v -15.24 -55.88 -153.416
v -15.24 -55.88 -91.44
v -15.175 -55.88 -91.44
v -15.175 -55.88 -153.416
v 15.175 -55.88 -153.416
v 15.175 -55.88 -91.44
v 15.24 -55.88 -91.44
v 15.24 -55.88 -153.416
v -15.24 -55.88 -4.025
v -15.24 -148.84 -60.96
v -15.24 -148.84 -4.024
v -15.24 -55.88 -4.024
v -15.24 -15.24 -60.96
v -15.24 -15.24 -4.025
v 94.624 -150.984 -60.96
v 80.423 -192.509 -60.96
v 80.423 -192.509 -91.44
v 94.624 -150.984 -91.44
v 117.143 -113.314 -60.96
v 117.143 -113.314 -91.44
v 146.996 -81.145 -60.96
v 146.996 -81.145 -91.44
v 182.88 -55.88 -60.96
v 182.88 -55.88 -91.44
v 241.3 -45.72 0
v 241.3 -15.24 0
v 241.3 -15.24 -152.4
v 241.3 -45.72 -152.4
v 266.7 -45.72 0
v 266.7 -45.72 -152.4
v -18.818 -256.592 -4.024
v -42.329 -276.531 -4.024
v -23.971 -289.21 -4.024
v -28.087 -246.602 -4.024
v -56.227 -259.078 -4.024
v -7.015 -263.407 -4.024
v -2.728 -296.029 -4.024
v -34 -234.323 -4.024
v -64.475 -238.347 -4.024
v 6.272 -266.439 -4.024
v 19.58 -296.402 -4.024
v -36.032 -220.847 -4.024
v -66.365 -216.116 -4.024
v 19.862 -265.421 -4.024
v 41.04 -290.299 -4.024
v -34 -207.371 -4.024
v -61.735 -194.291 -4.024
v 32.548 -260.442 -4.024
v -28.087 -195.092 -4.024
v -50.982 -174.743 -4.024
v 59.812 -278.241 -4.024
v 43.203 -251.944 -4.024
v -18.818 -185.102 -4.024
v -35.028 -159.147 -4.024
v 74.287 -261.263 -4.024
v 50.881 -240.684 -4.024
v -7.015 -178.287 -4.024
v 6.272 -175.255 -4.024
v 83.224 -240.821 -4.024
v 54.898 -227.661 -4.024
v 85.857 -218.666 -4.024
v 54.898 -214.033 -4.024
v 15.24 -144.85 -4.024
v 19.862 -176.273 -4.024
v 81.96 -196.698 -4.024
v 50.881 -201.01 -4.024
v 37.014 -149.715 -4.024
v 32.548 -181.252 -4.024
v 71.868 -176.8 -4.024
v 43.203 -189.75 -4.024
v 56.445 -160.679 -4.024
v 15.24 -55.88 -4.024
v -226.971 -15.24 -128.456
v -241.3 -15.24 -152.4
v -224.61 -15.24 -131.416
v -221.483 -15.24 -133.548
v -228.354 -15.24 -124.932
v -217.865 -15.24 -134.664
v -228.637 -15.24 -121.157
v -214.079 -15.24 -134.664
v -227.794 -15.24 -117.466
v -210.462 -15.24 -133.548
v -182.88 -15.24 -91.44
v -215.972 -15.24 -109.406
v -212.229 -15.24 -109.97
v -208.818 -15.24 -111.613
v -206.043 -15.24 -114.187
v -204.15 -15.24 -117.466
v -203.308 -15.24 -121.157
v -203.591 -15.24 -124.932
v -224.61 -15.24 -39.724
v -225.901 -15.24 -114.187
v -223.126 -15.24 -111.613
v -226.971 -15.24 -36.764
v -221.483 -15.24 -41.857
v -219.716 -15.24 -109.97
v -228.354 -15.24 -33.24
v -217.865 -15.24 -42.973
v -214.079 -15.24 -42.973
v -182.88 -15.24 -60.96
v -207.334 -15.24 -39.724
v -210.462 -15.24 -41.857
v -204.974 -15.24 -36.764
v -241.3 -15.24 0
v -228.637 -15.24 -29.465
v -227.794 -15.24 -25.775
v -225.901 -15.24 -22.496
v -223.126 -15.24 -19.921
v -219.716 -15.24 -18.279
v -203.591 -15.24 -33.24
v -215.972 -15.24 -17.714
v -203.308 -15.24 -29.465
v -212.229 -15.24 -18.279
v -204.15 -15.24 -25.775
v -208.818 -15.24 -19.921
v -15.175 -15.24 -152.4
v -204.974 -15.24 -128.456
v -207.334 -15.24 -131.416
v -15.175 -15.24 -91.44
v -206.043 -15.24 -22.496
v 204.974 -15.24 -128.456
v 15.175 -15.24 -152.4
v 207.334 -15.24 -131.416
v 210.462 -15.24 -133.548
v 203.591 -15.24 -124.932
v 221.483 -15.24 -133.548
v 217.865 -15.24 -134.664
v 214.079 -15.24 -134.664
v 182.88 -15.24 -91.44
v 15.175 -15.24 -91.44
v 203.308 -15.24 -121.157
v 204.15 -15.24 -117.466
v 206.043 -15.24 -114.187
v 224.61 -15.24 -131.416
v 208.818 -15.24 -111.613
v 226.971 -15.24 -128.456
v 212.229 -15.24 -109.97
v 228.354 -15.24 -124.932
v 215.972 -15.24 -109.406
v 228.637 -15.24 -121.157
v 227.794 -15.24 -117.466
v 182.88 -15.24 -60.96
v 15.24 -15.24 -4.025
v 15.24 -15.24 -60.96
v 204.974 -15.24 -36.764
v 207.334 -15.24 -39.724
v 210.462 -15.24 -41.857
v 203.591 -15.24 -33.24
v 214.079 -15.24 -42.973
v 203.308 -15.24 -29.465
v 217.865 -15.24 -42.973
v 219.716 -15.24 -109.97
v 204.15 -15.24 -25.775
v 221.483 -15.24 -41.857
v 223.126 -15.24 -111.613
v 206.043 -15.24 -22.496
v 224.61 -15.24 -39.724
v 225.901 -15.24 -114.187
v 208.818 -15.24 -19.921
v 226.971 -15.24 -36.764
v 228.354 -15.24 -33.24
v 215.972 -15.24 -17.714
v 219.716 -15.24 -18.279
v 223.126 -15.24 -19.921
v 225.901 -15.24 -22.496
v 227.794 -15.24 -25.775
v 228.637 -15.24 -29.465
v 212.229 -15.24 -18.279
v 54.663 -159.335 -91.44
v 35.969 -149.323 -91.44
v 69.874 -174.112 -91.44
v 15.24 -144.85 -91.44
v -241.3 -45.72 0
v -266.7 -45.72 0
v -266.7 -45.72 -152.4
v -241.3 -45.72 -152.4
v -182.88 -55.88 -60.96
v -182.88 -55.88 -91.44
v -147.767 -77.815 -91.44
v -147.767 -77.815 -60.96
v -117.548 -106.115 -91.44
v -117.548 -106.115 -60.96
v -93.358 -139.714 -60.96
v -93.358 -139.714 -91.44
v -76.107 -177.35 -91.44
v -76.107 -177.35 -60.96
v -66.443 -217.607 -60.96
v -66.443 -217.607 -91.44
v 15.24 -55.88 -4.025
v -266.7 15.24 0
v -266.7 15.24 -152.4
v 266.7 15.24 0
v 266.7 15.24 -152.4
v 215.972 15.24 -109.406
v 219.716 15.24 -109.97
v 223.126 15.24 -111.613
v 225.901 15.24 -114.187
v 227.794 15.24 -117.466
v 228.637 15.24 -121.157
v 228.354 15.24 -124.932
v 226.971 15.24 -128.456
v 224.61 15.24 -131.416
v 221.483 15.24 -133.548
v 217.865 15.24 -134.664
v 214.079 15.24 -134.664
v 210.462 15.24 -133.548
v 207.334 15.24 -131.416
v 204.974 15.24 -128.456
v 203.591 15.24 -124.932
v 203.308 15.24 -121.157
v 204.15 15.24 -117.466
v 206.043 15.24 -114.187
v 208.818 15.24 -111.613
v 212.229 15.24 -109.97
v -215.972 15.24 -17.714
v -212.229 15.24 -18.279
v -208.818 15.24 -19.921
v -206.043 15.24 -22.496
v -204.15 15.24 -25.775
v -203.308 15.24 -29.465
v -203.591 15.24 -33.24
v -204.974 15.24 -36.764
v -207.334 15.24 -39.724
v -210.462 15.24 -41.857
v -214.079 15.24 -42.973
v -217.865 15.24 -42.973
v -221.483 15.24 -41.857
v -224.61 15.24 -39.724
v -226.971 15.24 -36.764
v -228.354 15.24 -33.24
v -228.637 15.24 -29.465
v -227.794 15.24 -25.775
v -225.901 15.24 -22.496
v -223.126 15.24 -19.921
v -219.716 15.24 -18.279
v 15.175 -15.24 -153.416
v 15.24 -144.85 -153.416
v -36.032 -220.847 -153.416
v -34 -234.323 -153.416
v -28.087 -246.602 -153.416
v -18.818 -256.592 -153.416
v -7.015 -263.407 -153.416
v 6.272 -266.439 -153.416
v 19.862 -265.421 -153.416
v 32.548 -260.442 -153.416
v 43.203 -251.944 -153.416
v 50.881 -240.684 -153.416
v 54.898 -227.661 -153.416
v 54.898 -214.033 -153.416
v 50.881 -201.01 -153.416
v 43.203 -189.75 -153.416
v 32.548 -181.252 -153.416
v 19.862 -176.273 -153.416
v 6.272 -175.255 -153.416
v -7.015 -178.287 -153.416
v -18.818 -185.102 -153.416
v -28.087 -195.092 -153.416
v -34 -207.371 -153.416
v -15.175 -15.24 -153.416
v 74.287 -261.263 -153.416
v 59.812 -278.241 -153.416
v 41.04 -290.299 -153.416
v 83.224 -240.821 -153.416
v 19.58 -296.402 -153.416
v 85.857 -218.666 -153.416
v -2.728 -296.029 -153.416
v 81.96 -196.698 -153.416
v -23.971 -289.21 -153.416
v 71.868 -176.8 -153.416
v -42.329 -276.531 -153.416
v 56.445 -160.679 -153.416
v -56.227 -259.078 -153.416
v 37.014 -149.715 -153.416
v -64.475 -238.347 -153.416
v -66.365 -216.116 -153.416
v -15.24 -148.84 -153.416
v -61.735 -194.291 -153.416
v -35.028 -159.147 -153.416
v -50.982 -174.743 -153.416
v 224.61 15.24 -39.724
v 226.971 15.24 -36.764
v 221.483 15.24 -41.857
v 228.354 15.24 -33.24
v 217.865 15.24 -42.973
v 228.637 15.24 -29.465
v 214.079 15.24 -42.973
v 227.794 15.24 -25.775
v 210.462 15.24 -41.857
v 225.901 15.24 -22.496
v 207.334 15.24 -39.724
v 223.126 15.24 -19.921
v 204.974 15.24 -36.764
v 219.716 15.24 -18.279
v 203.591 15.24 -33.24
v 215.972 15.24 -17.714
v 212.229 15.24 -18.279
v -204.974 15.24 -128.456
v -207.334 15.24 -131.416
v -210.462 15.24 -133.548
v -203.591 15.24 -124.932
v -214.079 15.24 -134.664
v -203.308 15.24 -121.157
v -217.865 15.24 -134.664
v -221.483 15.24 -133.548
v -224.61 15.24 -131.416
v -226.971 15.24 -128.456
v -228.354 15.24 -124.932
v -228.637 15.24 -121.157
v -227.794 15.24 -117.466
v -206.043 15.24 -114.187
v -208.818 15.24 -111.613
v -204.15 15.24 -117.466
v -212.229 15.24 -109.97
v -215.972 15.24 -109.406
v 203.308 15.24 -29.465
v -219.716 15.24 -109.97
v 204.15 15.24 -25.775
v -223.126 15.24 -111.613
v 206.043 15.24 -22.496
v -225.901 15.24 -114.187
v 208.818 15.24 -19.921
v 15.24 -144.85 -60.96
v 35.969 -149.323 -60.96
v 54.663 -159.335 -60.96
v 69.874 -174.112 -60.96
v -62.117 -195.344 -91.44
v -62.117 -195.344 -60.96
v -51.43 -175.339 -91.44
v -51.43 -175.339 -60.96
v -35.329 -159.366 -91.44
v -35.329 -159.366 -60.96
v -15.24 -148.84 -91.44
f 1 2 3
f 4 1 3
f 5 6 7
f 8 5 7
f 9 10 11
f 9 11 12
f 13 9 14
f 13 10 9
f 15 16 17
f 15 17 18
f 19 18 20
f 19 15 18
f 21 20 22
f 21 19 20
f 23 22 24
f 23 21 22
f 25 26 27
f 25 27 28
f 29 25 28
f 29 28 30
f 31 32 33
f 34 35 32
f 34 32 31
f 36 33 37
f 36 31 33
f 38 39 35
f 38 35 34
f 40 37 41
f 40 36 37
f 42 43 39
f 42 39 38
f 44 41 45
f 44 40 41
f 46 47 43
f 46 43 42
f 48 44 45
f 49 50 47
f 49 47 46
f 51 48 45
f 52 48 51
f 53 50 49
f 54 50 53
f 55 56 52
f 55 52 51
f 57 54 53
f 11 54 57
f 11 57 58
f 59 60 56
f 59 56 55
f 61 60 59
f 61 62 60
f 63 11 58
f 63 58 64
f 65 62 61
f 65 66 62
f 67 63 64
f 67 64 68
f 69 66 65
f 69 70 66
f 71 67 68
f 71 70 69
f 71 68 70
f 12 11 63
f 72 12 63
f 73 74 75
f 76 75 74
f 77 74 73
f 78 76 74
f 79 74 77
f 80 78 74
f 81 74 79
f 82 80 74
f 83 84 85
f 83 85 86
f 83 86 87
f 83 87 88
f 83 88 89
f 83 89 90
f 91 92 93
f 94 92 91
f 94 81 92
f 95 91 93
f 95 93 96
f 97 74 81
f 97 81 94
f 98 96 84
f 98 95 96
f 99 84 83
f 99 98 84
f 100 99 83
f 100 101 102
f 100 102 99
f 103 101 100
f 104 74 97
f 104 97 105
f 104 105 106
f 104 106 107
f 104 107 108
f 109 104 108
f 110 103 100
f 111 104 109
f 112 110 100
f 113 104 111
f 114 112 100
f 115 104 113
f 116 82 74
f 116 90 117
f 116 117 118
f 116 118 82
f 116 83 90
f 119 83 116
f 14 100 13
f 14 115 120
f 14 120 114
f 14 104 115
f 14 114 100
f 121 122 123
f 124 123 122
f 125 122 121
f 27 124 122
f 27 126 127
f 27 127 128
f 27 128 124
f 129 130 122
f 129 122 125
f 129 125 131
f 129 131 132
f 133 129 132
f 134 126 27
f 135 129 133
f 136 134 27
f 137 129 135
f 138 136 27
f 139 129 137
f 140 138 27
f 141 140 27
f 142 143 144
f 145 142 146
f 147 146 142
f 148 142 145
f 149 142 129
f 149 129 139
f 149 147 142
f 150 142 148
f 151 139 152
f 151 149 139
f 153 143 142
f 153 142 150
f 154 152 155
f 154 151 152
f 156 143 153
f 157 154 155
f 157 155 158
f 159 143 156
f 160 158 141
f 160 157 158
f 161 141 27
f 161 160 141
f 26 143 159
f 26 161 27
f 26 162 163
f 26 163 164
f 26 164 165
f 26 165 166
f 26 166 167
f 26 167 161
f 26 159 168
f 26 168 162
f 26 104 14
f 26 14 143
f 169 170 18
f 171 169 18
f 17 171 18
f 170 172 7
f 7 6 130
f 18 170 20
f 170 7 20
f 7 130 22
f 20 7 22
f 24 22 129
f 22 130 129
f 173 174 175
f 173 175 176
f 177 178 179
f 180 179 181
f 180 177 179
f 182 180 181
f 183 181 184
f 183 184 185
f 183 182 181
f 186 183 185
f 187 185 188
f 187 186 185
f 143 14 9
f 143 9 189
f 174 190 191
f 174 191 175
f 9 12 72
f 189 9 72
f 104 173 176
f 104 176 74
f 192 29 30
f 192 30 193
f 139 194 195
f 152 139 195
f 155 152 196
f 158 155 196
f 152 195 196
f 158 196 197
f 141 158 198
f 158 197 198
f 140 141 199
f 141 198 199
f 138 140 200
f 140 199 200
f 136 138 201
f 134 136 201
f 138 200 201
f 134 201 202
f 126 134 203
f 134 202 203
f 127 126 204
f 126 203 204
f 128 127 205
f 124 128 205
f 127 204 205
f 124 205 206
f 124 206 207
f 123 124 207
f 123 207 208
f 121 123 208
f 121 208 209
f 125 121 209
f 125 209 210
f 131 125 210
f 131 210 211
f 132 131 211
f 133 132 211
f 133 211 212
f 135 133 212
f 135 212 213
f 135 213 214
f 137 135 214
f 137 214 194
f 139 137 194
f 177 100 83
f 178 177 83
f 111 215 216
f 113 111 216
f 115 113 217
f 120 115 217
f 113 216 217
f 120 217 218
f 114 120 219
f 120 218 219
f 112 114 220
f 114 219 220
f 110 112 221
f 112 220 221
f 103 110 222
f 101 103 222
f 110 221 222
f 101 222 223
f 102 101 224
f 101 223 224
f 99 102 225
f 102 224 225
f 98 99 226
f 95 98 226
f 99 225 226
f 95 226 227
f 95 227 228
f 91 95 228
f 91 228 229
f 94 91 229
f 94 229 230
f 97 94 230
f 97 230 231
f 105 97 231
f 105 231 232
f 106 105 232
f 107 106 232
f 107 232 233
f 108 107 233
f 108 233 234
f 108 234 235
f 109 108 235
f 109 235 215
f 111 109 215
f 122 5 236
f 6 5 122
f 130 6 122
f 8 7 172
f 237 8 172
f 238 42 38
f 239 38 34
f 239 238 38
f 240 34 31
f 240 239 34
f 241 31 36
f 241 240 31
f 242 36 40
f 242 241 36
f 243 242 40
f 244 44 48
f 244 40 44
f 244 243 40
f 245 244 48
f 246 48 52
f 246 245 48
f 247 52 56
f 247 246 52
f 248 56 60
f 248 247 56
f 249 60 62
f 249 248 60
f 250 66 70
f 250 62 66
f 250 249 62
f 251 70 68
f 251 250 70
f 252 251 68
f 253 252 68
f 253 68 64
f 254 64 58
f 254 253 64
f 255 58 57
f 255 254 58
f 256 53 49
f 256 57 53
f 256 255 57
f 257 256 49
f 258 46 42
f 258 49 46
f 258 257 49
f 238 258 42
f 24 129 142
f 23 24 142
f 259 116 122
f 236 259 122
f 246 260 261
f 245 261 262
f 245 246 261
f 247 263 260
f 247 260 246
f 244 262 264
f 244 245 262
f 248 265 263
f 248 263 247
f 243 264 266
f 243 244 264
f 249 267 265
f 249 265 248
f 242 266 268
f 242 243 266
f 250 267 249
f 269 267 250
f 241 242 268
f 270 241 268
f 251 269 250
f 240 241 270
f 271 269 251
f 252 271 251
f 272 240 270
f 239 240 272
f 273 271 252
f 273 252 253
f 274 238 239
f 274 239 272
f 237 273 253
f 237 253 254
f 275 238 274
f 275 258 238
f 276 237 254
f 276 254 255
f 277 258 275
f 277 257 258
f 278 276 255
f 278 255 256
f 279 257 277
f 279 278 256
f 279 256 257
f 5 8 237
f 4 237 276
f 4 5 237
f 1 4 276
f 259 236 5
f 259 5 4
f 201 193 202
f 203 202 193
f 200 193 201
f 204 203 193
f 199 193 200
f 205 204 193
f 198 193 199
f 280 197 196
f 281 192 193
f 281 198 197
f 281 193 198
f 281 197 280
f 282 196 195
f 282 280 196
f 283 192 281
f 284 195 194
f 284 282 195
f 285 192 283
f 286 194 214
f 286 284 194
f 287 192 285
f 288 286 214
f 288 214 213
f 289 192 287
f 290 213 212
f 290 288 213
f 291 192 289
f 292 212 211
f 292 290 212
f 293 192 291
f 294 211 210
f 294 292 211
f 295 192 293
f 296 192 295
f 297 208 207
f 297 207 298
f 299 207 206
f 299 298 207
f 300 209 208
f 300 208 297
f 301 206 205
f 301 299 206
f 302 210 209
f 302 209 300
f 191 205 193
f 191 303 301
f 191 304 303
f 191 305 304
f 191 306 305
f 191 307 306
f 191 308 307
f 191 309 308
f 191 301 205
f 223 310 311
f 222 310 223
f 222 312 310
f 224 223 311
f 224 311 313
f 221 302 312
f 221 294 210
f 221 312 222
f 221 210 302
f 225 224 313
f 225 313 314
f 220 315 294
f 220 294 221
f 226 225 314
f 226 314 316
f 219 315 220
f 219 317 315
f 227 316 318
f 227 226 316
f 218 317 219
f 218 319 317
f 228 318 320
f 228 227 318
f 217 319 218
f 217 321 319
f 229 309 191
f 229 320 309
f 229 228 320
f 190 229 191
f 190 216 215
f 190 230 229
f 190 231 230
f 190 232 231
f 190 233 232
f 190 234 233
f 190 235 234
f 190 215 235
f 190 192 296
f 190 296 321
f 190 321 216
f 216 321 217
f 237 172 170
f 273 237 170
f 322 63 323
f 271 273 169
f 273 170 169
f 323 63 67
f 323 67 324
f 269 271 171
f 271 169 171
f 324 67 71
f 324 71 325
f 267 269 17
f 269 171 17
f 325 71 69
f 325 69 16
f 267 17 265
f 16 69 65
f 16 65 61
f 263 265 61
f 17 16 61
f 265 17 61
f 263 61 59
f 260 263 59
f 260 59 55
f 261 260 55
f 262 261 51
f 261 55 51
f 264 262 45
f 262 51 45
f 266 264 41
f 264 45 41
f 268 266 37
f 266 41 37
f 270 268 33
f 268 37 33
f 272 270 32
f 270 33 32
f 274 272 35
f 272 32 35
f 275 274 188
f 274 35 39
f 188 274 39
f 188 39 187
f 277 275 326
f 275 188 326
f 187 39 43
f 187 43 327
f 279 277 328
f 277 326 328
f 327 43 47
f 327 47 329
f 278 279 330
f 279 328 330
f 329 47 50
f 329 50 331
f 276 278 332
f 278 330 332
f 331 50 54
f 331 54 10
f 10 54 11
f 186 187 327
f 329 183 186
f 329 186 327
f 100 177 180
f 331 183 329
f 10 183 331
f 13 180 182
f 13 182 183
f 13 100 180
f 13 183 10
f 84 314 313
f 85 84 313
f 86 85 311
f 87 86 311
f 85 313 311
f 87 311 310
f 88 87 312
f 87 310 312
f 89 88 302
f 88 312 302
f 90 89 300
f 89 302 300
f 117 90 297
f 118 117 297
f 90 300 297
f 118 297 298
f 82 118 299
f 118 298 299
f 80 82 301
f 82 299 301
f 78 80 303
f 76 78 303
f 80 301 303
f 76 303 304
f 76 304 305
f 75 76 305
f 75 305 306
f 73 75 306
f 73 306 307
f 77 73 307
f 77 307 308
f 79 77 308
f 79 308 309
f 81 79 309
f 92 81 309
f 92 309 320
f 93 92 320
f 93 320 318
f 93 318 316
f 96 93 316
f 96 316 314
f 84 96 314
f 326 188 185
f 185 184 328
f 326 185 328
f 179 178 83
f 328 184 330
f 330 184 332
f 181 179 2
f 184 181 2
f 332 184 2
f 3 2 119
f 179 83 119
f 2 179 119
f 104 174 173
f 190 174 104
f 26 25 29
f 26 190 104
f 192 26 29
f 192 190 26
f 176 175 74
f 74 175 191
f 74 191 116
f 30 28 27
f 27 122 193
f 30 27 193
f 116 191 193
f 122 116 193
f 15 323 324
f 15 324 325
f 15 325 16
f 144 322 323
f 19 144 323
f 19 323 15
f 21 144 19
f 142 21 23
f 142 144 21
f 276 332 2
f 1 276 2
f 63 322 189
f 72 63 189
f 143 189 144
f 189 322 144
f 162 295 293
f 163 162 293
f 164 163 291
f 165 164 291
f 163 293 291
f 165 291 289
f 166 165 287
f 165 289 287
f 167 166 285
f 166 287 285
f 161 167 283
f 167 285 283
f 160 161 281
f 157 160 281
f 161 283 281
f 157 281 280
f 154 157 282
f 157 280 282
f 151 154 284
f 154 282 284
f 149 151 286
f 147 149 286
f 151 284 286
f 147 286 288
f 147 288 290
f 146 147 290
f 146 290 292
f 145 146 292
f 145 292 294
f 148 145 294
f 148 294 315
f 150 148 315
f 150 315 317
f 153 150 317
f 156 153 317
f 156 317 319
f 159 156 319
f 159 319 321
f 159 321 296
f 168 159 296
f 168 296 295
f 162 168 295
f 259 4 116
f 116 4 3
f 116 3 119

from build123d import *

# Parameters (mm, degrees)
BOSS_EXTRUDE1_DEPTH  = 152.4
SKETCH3_R            = 12.7
CUT_EXTRUDE1_DEPTH   = 40.64
SKETCH4_W            = 365.76
SKETCH4_H            = 30.48
BOSS_EXTRUDE2_DEPTH  = 40.64
BOSS_EXTRUDE7_DEPTH  = 30.48
SKETCH5_16_R         = 45.72
BOSS_EXTRUDE9_DEPTH  = 92.456
SKETCH9_W            = 206.074408616
SKETCH9_H            = 47.358127706
CUT_EXTRUDE3_DEPTH   = 256.032
SKETCH10_W           = 30.34917866
SKETCH10_H           = 40.64
BOSS_EXTRUDE10_DEPTH = 61.976
SKETCH11_W           = 30.48
SKETCH11_H           = 40.64
BOSS_EXTRUDE11_DEPTH = 56.934608


with BuildPart() as part:
    # Sketch1 → Boss-Extrude1 (new body)
    with BuildSketch(Plane.XY):
        Polygon((266.7, 15.24), (-266.7, 15.24), (-266.7, -15.24), (-266.7, -45.72), (-241.3, -45.72), (-241.3, -15.24), (241.3, -15.24), (241.3, -45.72), (266.7, -45.72), (266.7, -15.24), align=None)
    extrude(amount=-BOSS_EXTRUDE1_DEPTH)

    # Sketch3 → Cut-Extrude1 (cut)
    with BuildSketch(Plane(origin=(0, 15.24, 0), x_dir=(1, 0, 0), z_dir=(0, 1, 0))):
        with Locations((-215.972235605, 122.105743834)):
            Circle(SKETCH3_R)
        with Locations((-215.972235605, 30.414369603)):
            Circle(SKETCH3_R)
        with Locations((215.972235605, 30.414369603)):
            Circle(SKETCH3_R)
        with Locations((215.972235605, 122.105743834)):
            Circle(SKETCH3_R)
    extrude(amount=-CUT_EXTRUDE1_DEPTH, mode=Mode.SUBTRACT)

    # Sketch4 → Boss-Extrude2 (add)
    with BuildSketch(Plane.XZ.offset(15.24)):
        with Locations((0, -76.2)):
            Rectangle(SKETCH4_W, SKETCH4_H)
    extrude(amount=BOSS_EXTRUDE2_DEPTH)

    # Sketch5 → Boss-Extrude7 (add)
    with BuildSketch(Plane.XY.offset(-60.96)):
        with BuildLine():
            Line((-15.24, -148.839934257), (-15.24, -55.88))
            Line((-15.24, -55.88), (-182.88, -55.88))
            ThreePointArc((-182.88, -55.88), (-104.636686401, -122.326673794), (-66.442758058, -217.60731411))
            ThreePointArc((-66.442758058, -217.60731411), (-51.430319931, -175.339319441), (-15.24, -148.839934257))
        make_face()
        with BuildLine():
            Line((182.88, -55.88), (15.24, -55.88))
            Line((15.24, -55.88), (15.24, -144.84950765))
            ThreePointArc((15.24, -144.84950765), (54.663389815, -159.335335359), (80.423000783, -192.508898804))
            ThreePointArc((80.423000783, -192.508898804), (117.142790659, -113.314475438), (182.88, -55.88))
        make_face()
    extrude(amount=-BOSS_EXTRUDE7_DEPTH)

    # Sketch5<16> → Boss-Extrude9 (add, symmetric)
    with BuildSketch(Plane.XY.offset(-60.96)):
        with BuildLine():
            Line((-15.24, -55.88), (15.24, -55.88))
            Line((15.24, -55.88), (15.24, -144.84950765))
            ThreePointArc((15.24, -144.84950765), (19.579997786, -296.402247336), (-15.24, -148.839934257))
            Line((-15.24, -148.839934257), (-15.24, -55.88))
        make_face()
        with Locations((9.688342188, -220.847001658)):
            Circle(SKETCH5_16_R, mode=Mode.SUBTRACT)
    extrude(amount=BOSS_EXTRUDE9_DEPTH, both=True)

    # Sketch9 → Cut-Extrude3 (cut)
    with BuildSketch(Plane(origin=(0, -55.88, 0), x_dir=(1, 0, 0), z_dir=(0, 1, 0))):
        with Locations((3.259772677, -19.655003422)):
            Rectangle(SKETCH9_W, SKETCH9_H)
    extrude(amount=-CUT_EXTRUDE3_DEPTH, mode=Mode.SUBTRACT)

    # Sketch10 → Boss-Extrude10 (add)
    with BuildSketch(Plane(origin=(0, 0, -91.44), x_dir=(-1, 0, 0), z_dir=(0, 0, -1))):
        with Locations((0, -35.56)):
            Rectangle(SKETCH10_W, SKETCH10_H)
    extrude(amount=BOSS_EXTRUDE10_DEPTH)

    # Sketch11 → Boss-Extrude11 (add)
    with BuildSketch(Plane.XY.offset(-60.96)):
        with Locations((0, -35.56)):
            Rectangle(SKETCH11_W, SKETCH11_H)
    extrude(amount=BOSS_EXTRUDE11_DEPTH)


solid = part.part
